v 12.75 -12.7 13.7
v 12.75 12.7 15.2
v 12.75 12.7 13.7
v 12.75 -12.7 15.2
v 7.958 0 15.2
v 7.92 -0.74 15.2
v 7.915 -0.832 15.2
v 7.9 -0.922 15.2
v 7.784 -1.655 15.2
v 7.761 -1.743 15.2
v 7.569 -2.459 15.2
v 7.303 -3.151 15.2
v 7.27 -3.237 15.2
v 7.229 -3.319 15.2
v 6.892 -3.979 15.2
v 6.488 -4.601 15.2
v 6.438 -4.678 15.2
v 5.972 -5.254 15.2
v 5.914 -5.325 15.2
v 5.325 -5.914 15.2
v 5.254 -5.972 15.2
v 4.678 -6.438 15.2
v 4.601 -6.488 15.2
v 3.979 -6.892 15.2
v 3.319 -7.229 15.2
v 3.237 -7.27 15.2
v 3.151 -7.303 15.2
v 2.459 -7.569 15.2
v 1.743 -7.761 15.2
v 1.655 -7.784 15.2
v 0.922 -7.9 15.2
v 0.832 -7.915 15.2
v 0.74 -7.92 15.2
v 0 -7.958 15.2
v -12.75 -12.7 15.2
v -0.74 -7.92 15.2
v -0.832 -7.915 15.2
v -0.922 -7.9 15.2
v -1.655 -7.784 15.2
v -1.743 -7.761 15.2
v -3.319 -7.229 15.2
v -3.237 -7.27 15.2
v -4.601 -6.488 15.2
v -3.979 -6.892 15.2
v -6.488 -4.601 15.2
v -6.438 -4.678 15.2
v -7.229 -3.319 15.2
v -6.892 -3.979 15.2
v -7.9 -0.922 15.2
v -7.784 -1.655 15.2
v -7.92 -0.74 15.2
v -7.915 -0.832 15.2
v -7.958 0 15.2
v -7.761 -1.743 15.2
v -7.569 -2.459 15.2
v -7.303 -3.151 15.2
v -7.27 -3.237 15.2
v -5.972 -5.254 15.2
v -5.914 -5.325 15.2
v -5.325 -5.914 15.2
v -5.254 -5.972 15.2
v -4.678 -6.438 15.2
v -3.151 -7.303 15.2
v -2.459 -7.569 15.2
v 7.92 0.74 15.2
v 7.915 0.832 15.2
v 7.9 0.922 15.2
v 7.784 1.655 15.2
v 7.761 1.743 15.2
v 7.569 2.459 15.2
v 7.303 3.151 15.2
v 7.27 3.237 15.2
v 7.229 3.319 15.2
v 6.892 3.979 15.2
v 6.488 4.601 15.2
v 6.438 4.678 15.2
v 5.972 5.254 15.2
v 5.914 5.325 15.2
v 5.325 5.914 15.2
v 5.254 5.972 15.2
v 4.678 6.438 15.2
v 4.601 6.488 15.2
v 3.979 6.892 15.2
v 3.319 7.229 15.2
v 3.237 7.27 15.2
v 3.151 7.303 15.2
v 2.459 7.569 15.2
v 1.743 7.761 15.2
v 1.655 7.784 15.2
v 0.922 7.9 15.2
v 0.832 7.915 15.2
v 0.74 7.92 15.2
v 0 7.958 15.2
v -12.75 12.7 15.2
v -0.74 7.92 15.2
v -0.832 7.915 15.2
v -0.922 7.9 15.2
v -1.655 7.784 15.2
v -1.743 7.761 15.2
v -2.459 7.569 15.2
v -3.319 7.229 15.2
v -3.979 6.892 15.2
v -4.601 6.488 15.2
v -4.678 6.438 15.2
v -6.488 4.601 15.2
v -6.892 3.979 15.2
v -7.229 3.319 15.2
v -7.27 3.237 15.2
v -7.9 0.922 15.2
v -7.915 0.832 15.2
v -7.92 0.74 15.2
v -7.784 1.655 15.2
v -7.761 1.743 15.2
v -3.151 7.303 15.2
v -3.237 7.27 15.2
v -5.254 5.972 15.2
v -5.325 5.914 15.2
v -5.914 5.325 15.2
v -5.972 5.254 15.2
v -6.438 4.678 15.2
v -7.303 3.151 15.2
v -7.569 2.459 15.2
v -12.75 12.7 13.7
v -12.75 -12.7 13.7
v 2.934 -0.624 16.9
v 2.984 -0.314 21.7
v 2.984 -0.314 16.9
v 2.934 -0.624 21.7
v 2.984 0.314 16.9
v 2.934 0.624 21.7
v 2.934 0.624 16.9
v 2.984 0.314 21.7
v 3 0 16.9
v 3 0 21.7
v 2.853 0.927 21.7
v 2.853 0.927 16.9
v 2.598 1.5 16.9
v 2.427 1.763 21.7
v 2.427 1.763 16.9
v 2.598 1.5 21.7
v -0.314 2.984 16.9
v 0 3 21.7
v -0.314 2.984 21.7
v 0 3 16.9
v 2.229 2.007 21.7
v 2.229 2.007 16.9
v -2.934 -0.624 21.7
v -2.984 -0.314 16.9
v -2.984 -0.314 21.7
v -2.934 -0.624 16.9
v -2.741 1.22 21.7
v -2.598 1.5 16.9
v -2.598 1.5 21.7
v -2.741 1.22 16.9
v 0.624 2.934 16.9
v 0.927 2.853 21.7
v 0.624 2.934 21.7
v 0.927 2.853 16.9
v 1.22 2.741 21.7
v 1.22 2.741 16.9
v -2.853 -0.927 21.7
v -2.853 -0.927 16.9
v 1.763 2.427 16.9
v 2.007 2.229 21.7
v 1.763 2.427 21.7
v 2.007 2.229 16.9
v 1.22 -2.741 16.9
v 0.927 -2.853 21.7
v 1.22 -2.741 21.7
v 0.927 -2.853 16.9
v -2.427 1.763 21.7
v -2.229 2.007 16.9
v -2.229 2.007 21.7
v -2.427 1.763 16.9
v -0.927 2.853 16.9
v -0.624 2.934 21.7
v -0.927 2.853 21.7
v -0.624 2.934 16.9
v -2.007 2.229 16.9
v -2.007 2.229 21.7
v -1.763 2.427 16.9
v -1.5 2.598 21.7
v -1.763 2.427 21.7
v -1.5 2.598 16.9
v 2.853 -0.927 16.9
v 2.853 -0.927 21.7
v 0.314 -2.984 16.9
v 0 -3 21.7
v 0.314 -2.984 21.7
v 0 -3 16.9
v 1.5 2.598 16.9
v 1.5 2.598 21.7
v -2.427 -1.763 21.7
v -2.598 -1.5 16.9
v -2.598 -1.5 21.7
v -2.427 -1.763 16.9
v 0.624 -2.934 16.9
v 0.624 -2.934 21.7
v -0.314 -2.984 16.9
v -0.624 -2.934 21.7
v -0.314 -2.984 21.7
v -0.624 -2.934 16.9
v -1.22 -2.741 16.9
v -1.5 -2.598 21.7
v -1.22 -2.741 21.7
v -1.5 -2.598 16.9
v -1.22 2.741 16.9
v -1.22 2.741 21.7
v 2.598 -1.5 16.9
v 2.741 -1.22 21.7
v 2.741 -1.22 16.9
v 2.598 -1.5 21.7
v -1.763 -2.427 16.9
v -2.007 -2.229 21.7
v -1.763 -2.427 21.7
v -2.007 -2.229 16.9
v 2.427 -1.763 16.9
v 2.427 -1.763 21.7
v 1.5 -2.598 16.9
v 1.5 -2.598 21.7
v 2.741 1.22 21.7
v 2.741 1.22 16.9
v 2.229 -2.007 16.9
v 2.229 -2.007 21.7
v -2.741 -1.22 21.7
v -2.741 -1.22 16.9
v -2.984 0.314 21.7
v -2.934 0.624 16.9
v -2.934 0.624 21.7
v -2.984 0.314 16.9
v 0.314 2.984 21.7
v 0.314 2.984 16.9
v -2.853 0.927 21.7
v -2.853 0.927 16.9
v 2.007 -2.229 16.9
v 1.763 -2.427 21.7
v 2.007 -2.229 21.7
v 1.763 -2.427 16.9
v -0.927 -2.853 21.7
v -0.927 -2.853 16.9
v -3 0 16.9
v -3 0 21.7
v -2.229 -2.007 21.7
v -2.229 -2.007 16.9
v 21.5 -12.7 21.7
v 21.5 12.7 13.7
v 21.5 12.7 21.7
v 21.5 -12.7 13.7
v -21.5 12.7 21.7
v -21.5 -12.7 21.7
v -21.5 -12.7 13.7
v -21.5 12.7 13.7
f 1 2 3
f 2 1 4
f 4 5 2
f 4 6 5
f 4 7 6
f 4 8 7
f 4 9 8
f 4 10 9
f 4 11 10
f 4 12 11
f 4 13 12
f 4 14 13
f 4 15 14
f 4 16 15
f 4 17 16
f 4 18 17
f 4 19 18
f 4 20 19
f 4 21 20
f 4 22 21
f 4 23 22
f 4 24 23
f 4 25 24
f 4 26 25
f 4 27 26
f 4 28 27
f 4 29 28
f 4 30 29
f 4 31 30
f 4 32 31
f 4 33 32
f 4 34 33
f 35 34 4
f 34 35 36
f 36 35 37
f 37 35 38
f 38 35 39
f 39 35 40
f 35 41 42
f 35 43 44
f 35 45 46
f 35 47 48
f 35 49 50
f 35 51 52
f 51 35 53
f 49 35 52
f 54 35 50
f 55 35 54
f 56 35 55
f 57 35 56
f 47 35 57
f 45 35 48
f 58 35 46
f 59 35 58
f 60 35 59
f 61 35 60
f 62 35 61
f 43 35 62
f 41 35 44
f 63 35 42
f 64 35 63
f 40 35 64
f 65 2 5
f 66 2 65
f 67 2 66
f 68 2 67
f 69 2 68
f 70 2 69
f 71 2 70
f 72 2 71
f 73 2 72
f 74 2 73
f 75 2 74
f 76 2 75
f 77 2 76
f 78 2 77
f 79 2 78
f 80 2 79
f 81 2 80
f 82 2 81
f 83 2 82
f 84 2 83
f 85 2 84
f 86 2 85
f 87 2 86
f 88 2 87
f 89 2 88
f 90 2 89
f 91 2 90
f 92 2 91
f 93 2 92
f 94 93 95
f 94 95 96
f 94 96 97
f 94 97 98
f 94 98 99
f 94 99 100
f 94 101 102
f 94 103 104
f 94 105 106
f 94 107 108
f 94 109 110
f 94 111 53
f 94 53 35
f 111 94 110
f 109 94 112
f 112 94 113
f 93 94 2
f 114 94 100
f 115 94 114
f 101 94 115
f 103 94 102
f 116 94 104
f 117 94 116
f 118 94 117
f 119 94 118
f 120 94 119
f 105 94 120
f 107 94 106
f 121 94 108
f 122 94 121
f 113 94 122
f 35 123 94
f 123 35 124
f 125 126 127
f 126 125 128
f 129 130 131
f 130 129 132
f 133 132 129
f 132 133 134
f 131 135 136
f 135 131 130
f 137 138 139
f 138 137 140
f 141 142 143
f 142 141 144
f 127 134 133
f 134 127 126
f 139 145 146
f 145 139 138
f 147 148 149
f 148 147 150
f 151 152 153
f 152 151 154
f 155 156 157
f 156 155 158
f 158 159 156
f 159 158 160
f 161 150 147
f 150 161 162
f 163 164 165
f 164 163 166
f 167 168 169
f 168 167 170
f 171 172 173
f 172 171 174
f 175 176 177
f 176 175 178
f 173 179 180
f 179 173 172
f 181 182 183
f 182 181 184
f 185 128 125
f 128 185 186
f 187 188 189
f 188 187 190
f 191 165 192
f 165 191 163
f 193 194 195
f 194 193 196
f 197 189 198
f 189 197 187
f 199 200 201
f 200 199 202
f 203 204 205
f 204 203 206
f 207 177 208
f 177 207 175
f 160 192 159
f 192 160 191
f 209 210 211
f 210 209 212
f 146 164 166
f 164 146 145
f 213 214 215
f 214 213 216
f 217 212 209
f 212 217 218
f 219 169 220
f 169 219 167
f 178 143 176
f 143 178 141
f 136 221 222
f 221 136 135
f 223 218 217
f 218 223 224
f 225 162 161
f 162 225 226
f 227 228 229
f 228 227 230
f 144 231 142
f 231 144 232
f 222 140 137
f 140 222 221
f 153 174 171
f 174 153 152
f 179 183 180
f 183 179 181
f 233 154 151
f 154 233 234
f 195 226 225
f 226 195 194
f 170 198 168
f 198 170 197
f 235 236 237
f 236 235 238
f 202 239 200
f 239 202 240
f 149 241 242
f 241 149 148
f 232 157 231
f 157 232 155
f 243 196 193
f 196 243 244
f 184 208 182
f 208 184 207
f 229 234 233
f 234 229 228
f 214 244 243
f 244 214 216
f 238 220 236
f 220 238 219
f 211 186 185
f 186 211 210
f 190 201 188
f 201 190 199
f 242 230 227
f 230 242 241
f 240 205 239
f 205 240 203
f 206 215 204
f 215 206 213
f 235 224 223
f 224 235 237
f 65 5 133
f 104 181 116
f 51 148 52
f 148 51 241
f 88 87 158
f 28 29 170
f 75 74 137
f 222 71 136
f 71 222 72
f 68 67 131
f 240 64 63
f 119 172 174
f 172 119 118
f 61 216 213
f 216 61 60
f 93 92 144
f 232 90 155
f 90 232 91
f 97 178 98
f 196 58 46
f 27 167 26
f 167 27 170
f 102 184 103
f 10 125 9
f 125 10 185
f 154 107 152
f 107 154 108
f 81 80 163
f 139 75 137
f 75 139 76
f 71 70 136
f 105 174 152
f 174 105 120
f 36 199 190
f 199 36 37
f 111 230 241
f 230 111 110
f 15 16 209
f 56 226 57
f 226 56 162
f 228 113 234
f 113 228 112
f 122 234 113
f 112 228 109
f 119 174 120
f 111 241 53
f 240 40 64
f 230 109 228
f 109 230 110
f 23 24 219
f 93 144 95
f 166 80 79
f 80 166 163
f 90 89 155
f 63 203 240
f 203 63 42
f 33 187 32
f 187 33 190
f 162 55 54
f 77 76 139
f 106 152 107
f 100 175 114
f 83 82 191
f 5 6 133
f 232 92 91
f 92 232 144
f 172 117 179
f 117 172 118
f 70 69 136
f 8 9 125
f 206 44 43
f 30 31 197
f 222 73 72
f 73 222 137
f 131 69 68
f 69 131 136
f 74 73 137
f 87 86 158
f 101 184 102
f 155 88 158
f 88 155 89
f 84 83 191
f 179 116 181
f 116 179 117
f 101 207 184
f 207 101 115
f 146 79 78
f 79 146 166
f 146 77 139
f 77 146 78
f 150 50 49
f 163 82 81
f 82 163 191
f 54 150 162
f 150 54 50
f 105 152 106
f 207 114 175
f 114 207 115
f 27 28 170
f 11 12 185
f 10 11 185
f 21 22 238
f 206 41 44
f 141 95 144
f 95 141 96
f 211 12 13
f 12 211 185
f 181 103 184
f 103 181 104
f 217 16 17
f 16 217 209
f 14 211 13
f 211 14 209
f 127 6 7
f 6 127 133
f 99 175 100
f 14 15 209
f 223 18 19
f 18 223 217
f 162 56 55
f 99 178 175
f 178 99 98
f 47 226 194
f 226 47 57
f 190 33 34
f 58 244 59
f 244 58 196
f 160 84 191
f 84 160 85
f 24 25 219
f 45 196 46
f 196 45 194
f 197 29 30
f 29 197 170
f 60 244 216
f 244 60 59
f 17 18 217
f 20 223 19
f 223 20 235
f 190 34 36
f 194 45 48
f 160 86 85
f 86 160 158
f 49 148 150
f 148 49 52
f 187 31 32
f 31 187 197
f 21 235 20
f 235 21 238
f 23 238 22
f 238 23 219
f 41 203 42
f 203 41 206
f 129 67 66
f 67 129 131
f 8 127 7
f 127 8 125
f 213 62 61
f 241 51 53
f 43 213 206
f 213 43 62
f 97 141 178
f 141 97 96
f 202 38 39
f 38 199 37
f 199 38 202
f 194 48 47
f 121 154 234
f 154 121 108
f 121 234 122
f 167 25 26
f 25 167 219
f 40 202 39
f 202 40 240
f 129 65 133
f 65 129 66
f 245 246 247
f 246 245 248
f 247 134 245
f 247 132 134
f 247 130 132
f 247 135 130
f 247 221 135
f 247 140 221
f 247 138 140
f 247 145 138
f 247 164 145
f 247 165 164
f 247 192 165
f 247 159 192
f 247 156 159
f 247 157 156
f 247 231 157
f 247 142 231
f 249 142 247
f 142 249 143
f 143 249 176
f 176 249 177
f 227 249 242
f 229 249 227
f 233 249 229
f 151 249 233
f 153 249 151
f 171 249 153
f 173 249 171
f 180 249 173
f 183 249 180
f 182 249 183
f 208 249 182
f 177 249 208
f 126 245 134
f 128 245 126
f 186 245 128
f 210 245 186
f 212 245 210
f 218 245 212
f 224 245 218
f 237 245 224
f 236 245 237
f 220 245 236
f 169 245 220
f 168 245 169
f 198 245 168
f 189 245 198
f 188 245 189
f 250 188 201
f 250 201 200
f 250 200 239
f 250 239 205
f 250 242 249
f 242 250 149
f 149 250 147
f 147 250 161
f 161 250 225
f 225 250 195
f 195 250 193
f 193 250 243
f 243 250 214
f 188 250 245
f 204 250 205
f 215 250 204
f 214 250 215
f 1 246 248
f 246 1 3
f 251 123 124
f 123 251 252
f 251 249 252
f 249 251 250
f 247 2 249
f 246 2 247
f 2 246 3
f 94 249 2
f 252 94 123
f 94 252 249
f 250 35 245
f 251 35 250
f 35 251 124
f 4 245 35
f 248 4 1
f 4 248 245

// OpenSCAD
module dt12xy
(
    //thorlabs P/N DT12XY/M
    position=[60, -20, 1]
)
{
    translate(position)
    {
	union()
	{
	    rotate([90, 0, 0]) translate([0, 8, 13]) dt12xy_ajust();
	    rotate([0, 90, 0]) translate([8, 0, 13]) dt12xy_ajust();
	    cube([25.4, 25.4, 30], center=true);
	}
	dt12b_m();
    }
}


module dt12xy_ajust
(
)
{
    union()
    {
	cylinder(r=4, h=20, $fn=60);
	translate([0, 0, 10]) cylinder(r=5, h=10, $fn=60);
	translate([0, 0, 9]) cylinder(r1=4, r2=5, h=1, $fn=60);
    }
}

module dt12b_m
(
    //thorlabs P/N DT12B/M
    position=[0, 0, 14.7+3.]
)
{
    translate(position)
    difference()
    {
	cube([43, 25.4, 8], center=true);
	union()
	{
	    translate([0, 0, -3.5])
	    {
		cube([25.5, 25.5, 2], center=true);
		cylinder(r1=3, r2=3, h=20, $fn=60);
	    }
	    translate([0, 0, -3.2])
	    cylinder(r1=10, r2=3., h=2.4, $fn=60);
	}
    }
}


module optics_plate
(
    position=[40, -10, -19]
)
{
    translate(position)
    translate([0, 0, 2.5])
    difference()
    {
	cube([100, 50, 5], center=true);
	translate([5.05-position[0], -position[1], 0])
	cube([36, 25.1, 5.1], center=true);
    }
}

dt12b_m();
